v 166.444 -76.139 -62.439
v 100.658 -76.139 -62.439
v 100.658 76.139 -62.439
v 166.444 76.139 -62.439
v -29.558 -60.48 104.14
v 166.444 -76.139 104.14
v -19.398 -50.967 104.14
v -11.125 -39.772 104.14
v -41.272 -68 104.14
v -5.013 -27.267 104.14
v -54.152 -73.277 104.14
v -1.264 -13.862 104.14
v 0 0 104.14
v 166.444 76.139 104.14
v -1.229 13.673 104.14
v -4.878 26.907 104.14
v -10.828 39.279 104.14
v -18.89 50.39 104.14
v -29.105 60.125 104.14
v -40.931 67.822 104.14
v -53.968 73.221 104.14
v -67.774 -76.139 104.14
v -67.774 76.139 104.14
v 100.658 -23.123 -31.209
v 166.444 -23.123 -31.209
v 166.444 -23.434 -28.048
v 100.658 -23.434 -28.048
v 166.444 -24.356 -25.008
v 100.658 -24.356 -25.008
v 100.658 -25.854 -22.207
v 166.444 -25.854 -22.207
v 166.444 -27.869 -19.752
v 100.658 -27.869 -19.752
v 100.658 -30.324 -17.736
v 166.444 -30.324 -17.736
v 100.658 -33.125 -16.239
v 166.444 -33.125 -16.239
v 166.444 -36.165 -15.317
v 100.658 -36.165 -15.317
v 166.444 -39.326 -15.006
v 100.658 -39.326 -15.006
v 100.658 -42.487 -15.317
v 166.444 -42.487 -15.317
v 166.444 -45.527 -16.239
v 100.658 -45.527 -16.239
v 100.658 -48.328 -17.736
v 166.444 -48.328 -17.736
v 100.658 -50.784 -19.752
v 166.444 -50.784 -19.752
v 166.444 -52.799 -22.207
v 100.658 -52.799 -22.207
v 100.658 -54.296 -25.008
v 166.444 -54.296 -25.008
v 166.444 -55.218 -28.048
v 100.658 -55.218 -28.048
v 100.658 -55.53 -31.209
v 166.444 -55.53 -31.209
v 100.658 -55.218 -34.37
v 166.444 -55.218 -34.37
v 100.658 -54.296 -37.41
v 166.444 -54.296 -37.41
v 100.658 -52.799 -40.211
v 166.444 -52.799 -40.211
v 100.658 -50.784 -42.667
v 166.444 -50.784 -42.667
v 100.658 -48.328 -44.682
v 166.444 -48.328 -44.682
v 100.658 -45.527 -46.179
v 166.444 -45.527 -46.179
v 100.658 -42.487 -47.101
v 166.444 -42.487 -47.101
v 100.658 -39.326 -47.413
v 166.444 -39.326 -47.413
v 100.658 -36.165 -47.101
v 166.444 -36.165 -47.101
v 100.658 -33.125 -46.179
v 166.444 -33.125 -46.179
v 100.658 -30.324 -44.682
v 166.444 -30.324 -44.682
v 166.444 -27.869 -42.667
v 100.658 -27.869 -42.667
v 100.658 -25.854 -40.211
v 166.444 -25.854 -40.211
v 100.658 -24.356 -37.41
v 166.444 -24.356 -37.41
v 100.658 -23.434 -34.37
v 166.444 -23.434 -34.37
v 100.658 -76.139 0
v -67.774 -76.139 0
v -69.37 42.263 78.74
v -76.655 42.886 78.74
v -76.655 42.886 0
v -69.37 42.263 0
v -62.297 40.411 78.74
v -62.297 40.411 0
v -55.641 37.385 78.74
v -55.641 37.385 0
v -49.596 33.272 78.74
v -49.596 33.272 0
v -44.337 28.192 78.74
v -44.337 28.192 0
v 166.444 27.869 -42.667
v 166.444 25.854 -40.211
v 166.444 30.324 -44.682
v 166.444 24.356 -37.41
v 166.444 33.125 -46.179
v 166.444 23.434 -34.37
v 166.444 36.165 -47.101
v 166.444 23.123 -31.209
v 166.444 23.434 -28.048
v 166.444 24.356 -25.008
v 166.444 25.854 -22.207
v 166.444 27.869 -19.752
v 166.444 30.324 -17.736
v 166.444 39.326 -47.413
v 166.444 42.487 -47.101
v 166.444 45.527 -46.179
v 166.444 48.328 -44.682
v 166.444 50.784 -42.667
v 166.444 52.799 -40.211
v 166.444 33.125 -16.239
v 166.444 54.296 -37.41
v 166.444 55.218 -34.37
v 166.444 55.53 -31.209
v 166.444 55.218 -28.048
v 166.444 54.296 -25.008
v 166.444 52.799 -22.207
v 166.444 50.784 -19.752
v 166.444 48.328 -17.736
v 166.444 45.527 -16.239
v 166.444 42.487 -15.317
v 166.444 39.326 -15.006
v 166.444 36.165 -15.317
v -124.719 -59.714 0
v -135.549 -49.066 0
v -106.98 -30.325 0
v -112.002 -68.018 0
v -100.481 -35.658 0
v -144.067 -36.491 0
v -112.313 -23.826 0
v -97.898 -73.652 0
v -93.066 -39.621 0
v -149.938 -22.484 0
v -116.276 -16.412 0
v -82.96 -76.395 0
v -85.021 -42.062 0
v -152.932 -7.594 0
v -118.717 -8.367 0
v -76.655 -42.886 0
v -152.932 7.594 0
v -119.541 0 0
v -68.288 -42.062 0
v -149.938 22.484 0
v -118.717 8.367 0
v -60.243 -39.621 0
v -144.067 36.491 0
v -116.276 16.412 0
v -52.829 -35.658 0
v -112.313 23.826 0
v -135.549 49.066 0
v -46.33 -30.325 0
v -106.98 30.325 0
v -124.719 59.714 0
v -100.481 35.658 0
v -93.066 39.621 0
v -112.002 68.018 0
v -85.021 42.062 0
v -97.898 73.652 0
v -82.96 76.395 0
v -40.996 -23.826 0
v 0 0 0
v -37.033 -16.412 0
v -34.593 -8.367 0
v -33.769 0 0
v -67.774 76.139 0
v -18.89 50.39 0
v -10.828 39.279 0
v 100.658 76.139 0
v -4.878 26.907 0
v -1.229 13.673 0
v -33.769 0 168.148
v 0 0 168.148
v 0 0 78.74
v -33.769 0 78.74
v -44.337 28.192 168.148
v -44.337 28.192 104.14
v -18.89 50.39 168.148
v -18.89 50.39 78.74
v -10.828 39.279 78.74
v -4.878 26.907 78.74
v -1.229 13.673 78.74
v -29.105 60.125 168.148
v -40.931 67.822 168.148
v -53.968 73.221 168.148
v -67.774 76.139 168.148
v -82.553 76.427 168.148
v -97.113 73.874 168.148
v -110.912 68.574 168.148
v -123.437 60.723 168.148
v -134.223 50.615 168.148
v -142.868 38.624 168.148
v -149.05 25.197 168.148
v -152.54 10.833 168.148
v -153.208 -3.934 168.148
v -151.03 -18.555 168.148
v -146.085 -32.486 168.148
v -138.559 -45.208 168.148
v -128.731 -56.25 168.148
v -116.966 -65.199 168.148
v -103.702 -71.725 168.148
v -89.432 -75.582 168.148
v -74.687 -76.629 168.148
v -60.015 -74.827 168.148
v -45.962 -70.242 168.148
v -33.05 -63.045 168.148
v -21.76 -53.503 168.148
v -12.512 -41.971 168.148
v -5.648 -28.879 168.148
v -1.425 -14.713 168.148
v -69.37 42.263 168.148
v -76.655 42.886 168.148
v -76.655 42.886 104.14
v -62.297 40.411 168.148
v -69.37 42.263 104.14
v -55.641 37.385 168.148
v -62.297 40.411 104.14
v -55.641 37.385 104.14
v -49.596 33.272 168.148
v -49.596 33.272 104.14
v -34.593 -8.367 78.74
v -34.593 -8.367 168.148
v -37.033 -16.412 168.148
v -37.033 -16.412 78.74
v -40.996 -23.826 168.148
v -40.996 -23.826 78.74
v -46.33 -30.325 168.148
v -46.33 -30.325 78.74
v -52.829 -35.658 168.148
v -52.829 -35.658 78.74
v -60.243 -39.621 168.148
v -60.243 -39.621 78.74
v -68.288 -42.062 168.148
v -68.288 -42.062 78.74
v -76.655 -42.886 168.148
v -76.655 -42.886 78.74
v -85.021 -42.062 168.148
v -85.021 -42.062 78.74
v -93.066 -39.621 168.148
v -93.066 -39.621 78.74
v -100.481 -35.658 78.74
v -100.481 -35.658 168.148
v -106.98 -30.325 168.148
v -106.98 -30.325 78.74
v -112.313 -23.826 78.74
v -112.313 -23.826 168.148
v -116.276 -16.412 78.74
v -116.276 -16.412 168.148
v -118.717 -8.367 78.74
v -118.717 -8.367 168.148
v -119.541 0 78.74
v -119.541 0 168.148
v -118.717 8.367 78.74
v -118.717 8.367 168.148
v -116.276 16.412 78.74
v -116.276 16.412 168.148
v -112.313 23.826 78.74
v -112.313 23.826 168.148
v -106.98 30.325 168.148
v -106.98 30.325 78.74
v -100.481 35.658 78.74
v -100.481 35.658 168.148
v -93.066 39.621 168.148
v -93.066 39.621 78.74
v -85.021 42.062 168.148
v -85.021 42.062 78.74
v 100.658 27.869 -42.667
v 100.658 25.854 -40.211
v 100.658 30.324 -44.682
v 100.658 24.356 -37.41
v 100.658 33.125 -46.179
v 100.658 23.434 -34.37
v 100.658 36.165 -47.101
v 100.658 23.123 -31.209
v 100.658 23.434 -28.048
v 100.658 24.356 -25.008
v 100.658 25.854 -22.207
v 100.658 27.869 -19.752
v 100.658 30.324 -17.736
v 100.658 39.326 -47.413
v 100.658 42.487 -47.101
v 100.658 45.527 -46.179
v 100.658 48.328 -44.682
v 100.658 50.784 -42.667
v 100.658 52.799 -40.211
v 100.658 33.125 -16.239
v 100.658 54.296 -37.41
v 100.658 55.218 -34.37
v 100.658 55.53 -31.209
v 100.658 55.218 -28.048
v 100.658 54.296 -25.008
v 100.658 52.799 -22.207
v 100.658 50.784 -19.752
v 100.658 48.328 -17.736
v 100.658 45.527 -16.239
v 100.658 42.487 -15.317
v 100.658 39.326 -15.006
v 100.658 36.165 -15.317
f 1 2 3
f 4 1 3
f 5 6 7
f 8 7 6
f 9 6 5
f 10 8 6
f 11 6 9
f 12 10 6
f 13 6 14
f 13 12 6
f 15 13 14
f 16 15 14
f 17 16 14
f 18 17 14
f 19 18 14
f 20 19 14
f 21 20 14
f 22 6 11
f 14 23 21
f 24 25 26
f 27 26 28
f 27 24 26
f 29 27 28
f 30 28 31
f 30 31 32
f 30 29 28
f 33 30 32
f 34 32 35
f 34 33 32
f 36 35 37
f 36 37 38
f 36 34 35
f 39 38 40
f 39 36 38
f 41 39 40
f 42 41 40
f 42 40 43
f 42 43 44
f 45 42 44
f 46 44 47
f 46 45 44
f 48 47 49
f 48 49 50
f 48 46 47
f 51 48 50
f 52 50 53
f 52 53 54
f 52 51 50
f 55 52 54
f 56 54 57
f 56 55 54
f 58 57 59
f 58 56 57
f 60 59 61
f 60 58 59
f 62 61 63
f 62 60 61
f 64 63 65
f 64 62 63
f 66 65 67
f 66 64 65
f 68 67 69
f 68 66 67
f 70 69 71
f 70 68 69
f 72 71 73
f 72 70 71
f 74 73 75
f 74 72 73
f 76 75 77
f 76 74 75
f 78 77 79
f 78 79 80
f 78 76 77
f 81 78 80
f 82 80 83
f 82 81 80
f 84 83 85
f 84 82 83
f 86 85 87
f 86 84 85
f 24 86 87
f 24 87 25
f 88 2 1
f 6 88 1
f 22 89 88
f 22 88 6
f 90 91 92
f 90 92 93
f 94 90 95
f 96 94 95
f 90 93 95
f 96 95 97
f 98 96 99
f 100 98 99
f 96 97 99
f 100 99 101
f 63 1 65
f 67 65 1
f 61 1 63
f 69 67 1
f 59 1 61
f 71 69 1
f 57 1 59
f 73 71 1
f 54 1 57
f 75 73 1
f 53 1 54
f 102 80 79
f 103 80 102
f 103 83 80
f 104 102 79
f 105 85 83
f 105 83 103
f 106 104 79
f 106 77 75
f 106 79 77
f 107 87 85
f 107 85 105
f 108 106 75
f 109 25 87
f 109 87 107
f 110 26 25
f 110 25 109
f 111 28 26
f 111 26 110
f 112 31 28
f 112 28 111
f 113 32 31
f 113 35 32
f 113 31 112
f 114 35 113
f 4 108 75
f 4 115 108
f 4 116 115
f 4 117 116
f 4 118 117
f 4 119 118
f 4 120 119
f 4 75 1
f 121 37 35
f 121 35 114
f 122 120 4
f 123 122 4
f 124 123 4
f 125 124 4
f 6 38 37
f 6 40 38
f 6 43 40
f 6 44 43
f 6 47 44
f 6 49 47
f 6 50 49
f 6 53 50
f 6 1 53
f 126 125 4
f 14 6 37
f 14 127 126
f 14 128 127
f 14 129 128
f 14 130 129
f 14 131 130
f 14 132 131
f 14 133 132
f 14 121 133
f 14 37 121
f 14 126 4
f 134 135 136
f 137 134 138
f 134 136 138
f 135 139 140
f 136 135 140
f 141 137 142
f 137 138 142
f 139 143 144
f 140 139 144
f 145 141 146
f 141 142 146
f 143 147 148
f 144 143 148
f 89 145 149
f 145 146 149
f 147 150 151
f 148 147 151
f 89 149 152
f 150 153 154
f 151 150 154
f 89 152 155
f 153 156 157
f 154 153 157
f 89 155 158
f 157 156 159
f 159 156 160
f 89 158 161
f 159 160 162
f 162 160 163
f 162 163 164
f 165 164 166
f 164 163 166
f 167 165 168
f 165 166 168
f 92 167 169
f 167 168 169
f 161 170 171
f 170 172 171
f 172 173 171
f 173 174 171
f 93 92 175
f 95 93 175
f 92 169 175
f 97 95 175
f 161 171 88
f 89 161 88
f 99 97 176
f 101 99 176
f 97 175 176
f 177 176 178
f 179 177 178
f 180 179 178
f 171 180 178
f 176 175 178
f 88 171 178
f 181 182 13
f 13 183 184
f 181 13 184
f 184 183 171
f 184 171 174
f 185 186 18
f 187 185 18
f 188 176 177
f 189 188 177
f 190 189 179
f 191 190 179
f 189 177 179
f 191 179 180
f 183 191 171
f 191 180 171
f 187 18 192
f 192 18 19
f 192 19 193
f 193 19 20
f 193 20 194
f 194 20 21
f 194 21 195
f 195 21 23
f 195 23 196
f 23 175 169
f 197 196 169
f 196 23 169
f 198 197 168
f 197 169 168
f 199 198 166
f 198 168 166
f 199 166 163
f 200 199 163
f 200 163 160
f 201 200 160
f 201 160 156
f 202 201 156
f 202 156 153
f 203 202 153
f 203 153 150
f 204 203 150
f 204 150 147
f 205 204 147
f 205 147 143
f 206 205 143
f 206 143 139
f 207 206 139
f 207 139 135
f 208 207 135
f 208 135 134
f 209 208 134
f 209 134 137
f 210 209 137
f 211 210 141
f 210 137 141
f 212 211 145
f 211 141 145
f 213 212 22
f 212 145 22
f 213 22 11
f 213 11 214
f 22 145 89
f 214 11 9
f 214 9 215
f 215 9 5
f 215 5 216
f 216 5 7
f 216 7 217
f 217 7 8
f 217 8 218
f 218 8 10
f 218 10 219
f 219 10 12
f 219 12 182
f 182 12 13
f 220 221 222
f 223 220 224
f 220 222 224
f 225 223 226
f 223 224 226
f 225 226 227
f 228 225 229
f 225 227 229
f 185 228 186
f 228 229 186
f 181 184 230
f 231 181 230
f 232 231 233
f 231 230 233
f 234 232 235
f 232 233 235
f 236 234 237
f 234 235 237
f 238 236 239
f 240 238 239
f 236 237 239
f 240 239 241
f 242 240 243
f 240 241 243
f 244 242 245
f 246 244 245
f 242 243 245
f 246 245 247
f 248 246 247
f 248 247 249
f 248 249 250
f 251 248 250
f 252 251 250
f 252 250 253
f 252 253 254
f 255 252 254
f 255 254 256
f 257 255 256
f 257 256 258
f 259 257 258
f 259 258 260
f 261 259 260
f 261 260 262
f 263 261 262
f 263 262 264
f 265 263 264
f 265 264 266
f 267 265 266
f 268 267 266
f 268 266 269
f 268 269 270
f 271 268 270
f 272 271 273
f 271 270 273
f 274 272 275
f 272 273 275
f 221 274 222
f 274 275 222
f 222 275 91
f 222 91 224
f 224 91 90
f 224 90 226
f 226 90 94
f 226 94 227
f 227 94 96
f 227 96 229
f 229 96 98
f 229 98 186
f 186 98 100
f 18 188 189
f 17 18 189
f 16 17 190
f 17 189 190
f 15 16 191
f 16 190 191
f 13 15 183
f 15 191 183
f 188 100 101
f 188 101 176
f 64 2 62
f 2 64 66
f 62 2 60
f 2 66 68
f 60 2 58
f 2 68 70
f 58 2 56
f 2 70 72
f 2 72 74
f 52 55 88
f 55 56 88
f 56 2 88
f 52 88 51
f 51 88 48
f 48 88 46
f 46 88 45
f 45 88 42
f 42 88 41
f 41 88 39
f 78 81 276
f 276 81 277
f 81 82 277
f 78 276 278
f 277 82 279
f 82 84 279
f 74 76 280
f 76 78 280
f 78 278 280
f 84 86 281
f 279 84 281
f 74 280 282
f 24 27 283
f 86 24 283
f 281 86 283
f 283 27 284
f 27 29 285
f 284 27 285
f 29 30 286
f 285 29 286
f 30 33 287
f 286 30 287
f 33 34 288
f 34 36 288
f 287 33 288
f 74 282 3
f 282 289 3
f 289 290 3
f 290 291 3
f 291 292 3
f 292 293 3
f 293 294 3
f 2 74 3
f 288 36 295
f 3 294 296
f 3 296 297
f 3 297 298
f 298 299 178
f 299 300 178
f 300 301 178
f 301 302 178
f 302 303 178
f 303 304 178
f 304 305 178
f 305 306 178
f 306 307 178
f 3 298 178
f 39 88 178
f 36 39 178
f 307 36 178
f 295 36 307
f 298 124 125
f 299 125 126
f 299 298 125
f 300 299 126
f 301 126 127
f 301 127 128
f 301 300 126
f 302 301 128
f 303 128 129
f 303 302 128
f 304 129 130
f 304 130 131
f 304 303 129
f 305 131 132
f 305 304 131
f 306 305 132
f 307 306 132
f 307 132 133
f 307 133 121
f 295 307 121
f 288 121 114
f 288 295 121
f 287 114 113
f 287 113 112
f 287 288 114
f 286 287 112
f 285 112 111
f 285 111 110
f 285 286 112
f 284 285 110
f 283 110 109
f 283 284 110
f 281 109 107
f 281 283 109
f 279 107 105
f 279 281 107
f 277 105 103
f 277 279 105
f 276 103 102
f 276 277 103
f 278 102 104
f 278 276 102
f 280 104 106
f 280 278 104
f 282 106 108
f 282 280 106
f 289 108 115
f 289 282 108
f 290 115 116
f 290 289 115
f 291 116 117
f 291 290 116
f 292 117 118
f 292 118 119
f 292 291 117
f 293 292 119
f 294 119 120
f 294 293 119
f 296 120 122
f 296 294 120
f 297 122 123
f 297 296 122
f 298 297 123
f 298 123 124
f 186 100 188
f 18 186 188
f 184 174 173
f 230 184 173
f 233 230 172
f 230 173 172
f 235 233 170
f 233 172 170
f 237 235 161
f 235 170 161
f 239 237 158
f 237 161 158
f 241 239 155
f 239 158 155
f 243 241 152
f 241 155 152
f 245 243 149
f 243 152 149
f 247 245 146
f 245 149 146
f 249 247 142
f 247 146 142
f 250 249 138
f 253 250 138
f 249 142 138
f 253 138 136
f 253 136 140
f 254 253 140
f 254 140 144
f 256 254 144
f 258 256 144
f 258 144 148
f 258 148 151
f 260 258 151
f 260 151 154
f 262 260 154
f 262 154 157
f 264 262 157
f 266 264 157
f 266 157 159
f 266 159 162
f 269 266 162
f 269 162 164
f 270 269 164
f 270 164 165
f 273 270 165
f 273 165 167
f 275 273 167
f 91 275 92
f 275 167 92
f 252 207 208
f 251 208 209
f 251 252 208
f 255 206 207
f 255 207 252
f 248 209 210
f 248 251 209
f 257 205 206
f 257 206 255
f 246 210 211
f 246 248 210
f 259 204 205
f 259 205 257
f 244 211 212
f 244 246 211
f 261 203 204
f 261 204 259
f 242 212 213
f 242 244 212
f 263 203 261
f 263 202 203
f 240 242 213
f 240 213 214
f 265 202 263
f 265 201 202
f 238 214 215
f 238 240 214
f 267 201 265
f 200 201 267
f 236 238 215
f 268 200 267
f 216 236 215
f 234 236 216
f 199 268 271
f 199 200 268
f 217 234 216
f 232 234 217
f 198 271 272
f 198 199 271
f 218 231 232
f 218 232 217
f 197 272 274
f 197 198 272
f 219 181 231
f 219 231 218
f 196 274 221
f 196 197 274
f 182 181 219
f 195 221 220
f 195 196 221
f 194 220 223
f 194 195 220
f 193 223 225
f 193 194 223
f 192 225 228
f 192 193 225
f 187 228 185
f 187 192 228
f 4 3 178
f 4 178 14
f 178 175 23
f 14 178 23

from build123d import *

# Parameters (mm, degrees)
F1_DEPTH = 78.74
F2_DEPTH = 25.4
F3_DEPTH = 168.148
F4_W     = 152.277097106
F4_H     = 166.5787487769
F4_R     = 16.2034810418
F5_DEPTH = 65.786


with BuildPart() as f1:
    # F0 (on Top) → F1 (new body)
    with BuildSketch(Plane.XY):
        with BuildLine():
            Line((-76.6547471285, 42.8859197003), (-76.6547471285, 76.138548553))
            Line((-76.6547471285, 76.138548553), (-67.7737741201, 76.138548553))
            ThreePointArc((-67.7737741201, 76.138548553), (-153.309494257, 0), (-67.7737741201, -76.138548553))
            Line((-67.7737741201, -76.138548553), (-76.6547471285, -76.138548553))
            Line((-76.6547471285, -76.138548553), (-76.6547471285, -42.8859197003))
            ThreePointArc((-76.6547471285, -42.8859197003), (-119.5406668288, 0), (-76.6547471285, 42.8859197003))
        make_face()
        with BuildLine():
            Line((-67.7737741201, 76.138548553), (-76.6547471285, 76.138548553))
            Line((-76.6547471285, 76.138548553), (-76.6547471285, 42.8859197003))
            ThreePointArc((-76.6547471285, 42.8859197003), (-58.9040631626, 39.0399196629), (-44.3371342228, 28.1917364598))
            Line((-44.3371342228, 28.1917364598), (-18.8899035063, 50.3902083608))
            ThreePointArc((-18.8899035063, 50.3902083608), (-40.9313587918, 67.8217500739), (-67.7737741201, 76.138548553))
        make_face()
        with BuildLine():
            Line((100.6577461958, 76.138548553), (-67.7737741201, 76.138548553))
            ThreePointArc((-67.7737741201, 76.138548553), (-40.9313587918, 67.8217500739), (-18.8899035063, 50.3902083608))
            ThreePointArc((-18.8899035063, 50.3902083608), (-4.8776625607, 26.9072553093), (0, 0))
            ThreePointArc((0, 0), (-19.3977868636, -50.9665651046), (-67.7737741201, -76.138548553))
            Line((-67.7737741201, -76.138548553), (100.6577461958, -76.138548553))
            Line((100.6577461958, -76.138548553), (100.6577461958, 76.138548553))
        make_face()
        with BuildLine():
            Line((-76.6547471285, -76.138548553), (-67.7737741201, -76.138548553))
            ThreePointArc((-67.7737741201, -76.138548553), (-19.3977868636, -50.9665651046), (0, 0))
            Line((0, 0), (-33.7688274282, 0))
            ThreePointArc((-33.7688274282, 0), (-46.329822491, -30.3249246375), (-76.6547471285, -42.8859197003))
            Line((-76.6547471285, -42.8859197003), (-76.6547471285, -76.138548553))
        make_face()
    extrude(amount=F1_DEPTH)

    # F0 (on Top) + F1_face (on face) + F1_face1 (on face) → F2 (join)
    with BuildSketch(Plane.XY):
        with BuildLine():
            Line((-76.6547471285, 42.8859197003), (-76.6547471285, 76.138548553))
            Line((-76.6547471285, 76.138548553), (-67.7737741201, 76.138548553))
            ThreePointArc((-67.7737741201, 76.138548553), (-153.309494257, 0), (-67.7737741201, -76.138548553))
            Line((-67.7737741201, -76.138548553), (-76.6547471285, -76.138548553))
            Line((-76.6547471285, -76.138548553), (-76.6547471285, -42.8859197003))
            ThreePointArc((-76.6547471285, -42.8859197003), (-119.5406668288, 0), (-76.6547471285, 42.8859197003))
        make_face()
    with BuildSketch(Plane(origin=(-7.2978192901, -1.0520080629, 78.74), x_dir=(1, 0, 0), z_dir=(0, 0, 1))):
        with BuildLine():
            ThreePointArc((-60.47595483, 77.1905566159), (-146.0116749669, 1.0520080629), (-60.47595483, -75.08654049))
            Line((-60.47595483, -75.08654049), (107.9555654859, -75.08654049))
            Line((107.9555654859, -75.08654049), (107.9555654859, 77.1905566159))
            Line((107.9555654859, 77.1905566159), (-60.47595483, 77.1905566159))
        make_face()
        with BuildLine():
            ThreePointArc((-11.5920842162, 51.4422164237), (2.4201567294, 27.9592633723), (7.2978192901, 1.0520080629))
            Line((7.2978192901, 1.0520080629), (-26.4710081381, 1.0520080629))
            ThreePointArc((-26.4710081381, 1.0520080629), (-109.5139487719, -14.0017548647), (-37.0393149327, 29.2437445228))
            Line((-37.0393149327, 29.2437445228), (-11.5920842162, 51.4422164237))
        make_face(mode=Mode.SUBTRACT)
    with BuildSketch(Plane(origin=(-7.2978192901, -1.0520080629, 0), x_dir=(1, 0, 0), z_dir=(0, 0, -1))):
        with BuildLine():
            ThreePointArc((-60.47595483, 75.08654049), (-146.0116749669, -1.0520080629), (-60.47595483, -77.1905566159))
            Line((-60.47595483, -77.1905566159), (107.9555654859, -77.1905566159))
            Line((107.9555654859, -77.1905566159), (107.9555654859, 75.08654049))
            Line((107.9555654859, 75.08654049), (-60.47595483, 75.08654049))
        make_face()
        with BuildLine():
            ThreePointArc((7.2978192901, -1.0520080629), (2.4201567294, -27.9592633723), (-11.5920842162, -51.4422164237))
            Line((-11.5920842162, -51.4422164237), (-37.0393149327, -29.2437445228))
            ThreePointArc((-37.0393149327, -29.2437445228), (-109.5139487719, 14.0017548647), (-26.4710081381, -1.0520080629))
            Line((-26.4710081381, -1.0520080629), (7.2978192901, -1.0520080629))
        make_face(mode=Mode.SUBTRACT)
    extrude(amount=F2_DEPTH, dir=(0, 0, 1))

    # F0 (on Top) → F3 (join)
    with BuildSketch(Plane.XY):
        with BuildLine():
            Line((-76.6547471285, -76.138548553), (-67.7737741201, -76.138548553))
            ThreePointArc((-67.7737741201, -76.138548553), (-19.3977868636, -50.9665651046), (0, 0))
            Line((0, 0), (-33.7688274282, 0))
            ThreePointArc((-33.7688274282, 0), (-46.329822491, -30.3249246375), (-76.6547471285, -42.8859197003))
            Line((-76.6547471285, -42.8859197003), (-76.6547471285, -76.138548553))
        make_face()
        with BuildLine():
            Line((-76.6547471285, 42.8859197003), (-76.6547471285, 76.138548553))
            Line((-76.6547471285, 76.138548553), (-67.7737741201, 76.138548553))
            ThreePointArc((-67.7737741201, 76.138548553), (-153.309494257, 0), (-67.7737741201, -76.138548553))
            Line((-67.7737741201, -76.138548553), (-76.6547471285, -76.138548553))
            Line((-76.6547471285, -76.138548553), (-76.6547471285, -42.8859197003))
            ThreePointArc((-76.6547471285, -42.8859197003), (-119.5406668288, 0), (-76.6547471285, 42.8859197003))
        make_face()
        with BuildLine():
            Line((-67.7737741201, 76.138548553), (-76.6547471285, 76.138548553))
            Line((-76.6547471285, 76.138548553), (-76.6547471285, 42.8859197003))
            ThreePointArc((-76.6547471285, 42.8859197003), (-58.9040631626, 39.0399196629), (-44.3371342228, 28.1917364598))
            Line((-44.3371342228, 28.1917364598), (-18.8899035063, 50.3902083608))
            ThreePointArc((-18.8899035063, 50.3902083608), (-40.9313587918, 67.8217500739), (-67.7737741201, 76.138548553))
        make_face()
    extrude(amount=F3_DEPTH)

    # F4 (on face) → F5 (join)
    with BuildSketch(Plane.YZ.offset(100.6577461958)):
        with Locations((0, 20.8506256115)):
            Rectangle(F4_W, F4_H)
        with Locations((-39.326235652, -31.2090925872)):
            Circle(F4_R, mode=Mode.SUBTRACT)
        with Locations((39.326235652, -31.2090925872)):
            Circle(F4_R, mode=Mode.SUBTRACT)
    extrude(amount=F5_DEPTH)


solid = f1.part
